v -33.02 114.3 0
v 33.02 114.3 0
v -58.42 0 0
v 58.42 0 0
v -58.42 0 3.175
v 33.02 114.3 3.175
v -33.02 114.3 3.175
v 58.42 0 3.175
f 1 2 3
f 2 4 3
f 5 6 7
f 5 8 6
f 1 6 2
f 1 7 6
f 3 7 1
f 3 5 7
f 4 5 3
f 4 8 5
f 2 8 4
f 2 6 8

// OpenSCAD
/* =====================================================
   Trapezoid Plate (solid)
   =====================================================
   Isosceles trapezoid, extruded to a flat solid plate.
   Dimensions are specified in inches and converted to mm.

   Height (bottom edge → top edge) : 4.5 in  (114.3 mm)
   Bottom edge length              : 4.6 in  (116.84 mm)
   Top edge length                 : 2.6 in  ( 66.04 mm)
   Thickness                       : 1/8 in  (  3.175 mm)

   Prints flat on the bed, no supports.
   ===================================================== */

in = 25.4;   // mm per inch

/* ── Dimensions (inches) ─────────────────────────────── */
height_in    = 4.5;      // bottom edge to top edge
bottom_in    = 4.6;      // bottom edge length
top_in       = 2.6;      // top edge length
thickness_in = 1/8;      // plate thickness

/* ── Derived (mm) ────────────────────────────────────── */
H = height_in    * in;
B = bottom_in    * in;
T = top_in       * in;
Z = thickness_in * in;

module trapezoid_plate() {
    // Centered on X so the shape is symmetric; bottom edge on Y = 0.
    linear_extrude(height = Z)
        polygon([
            [-B/2, 0],
            [ B/2, 0],
            [ T/2, H],
            [-T/2, H],
        ]);
}

trapezoid_plate();
